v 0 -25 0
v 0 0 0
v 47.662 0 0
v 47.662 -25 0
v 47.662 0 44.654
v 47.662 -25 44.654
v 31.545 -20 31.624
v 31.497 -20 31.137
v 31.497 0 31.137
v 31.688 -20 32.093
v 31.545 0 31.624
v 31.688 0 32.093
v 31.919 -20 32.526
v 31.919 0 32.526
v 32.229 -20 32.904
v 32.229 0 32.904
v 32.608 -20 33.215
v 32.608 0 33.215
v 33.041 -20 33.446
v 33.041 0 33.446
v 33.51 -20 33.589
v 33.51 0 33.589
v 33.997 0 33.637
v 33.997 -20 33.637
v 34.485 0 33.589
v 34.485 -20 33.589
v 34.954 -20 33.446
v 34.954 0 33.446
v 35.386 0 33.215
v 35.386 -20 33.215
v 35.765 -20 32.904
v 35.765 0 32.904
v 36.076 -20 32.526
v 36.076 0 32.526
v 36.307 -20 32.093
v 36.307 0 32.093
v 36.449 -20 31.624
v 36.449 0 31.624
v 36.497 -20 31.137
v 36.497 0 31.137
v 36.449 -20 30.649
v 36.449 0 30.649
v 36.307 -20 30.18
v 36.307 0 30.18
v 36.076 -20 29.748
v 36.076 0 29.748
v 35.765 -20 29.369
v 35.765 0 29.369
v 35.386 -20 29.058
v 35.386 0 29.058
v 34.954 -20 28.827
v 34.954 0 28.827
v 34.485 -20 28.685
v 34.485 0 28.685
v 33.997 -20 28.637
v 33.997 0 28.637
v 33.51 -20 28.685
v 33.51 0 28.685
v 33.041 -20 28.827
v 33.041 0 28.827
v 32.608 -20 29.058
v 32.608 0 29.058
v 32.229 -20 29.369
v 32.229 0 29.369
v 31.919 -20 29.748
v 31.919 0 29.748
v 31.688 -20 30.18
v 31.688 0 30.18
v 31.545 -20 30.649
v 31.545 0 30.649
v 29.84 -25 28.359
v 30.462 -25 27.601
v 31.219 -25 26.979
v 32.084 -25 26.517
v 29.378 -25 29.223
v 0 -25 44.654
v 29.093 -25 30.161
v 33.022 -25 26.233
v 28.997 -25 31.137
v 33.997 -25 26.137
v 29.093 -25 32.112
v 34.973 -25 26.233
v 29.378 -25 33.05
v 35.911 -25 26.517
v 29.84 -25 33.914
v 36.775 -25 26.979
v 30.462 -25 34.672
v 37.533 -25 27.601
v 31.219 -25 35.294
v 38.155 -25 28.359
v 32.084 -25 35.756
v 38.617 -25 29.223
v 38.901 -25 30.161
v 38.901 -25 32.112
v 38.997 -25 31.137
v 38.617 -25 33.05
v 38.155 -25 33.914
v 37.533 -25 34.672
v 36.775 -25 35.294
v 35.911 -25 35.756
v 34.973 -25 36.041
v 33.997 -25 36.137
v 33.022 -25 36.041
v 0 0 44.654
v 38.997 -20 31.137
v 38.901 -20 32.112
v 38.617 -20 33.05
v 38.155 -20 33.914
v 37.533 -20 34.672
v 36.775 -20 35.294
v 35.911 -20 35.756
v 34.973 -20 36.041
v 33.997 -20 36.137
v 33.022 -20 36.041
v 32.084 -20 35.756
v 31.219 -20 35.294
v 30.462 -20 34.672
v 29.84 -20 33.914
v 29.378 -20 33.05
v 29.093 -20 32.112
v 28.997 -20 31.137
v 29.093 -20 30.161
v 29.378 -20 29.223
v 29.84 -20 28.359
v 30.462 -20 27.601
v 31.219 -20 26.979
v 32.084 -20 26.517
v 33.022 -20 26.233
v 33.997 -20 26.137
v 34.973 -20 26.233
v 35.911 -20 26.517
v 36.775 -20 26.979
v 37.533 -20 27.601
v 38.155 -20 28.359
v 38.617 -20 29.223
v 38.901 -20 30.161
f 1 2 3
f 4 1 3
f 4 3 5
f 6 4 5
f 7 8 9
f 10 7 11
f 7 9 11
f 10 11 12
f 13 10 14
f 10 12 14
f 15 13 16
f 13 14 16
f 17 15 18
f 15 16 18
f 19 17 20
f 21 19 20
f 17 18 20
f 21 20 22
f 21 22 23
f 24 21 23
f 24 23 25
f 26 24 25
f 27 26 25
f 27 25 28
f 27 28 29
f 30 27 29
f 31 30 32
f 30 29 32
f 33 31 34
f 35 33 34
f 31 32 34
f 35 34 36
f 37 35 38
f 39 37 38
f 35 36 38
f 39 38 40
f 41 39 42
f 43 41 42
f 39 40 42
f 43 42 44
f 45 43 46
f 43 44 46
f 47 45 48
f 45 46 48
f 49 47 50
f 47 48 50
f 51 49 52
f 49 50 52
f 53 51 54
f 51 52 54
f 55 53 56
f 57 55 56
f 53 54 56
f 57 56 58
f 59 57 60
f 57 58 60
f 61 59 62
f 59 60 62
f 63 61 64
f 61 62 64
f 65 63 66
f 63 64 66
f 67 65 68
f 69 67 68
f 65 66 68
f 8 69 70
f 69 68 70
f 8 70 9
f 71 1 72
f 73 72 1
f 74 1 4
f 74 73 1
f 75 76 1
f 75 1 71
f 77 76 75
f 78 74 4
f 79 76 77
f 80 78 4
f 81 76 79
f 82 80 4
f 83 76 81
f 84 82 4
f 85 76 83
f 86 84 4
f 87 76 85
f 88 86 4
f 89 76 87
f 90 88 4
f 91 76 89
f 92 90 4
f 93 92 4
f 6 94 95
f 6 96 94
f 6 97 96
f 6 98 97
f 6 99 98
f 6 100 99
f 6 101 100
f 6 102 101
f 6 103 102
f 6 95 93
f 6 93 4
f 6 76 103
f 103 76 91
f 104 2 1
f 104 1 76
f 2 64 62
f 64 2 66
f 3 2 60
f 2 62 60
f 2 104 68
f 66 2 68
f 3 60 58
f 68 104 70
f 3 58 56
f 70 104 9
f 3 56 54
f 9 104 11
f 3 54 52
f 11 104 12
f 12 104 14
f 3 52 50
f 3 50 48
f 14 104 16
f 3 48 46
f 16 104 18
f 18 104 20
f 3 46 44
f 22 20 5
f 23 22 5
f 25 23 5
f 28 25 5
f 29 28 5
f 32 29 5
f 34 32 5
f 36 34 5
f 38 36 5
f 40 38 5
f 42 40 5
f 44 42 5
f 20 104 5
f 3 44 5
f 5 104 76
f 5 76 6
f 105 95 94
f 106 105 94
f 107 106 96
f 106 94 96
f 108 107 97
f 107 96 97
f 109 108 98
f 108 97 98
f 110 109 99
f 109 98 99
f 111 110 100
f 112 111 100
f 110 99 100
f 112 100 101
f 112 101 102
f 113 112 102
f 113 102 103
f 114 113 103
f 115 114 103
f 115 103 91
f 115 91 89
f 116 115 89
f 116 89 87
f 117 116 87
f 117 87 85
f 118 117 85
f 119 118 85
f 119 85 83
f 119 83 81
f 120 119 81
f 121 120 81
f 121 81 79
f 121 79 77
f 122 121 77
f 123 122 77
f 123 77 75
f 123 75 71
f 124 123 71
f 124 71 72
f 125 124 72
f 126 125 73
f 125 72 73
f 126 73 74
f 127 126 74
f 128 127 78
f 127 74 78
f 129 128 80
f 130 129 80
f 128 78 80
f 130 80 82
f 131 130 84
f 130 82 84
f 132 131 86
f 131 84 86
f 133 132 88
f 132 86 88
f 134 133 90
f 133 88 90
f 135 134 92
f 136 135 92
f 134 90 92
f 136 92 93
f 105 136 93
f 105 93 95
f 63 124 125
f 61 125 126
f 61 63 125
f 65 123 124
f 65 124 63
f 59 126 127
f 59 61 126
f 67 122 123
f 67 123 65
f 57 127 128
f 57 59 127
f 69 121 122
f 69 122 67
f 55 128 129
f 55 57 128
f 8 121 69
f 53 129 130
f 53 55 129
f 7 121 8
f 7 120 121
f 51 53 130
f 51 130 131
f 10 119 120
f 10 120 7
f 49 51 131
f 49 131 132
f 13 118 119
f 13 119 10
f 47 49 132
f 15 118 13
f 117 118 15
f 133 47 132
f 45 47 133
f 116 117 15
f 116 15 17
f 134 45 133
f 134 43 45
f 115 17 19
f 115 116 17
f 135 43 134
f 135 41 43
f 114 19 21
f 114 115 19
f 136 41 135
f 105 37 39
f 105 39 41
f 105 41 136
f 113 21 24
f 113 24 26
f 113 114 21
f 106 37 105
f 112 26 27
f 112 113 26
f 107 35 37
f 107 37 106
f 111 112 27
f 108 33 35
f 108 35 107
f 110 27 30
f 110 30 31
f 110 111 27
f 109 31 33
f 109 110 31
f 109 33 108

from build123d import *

# Parameters (mm, degrees)
F0_W           = 47.661982
F0_H           = 44.654008
F1_DEPTH       = 25
F3_D           = 5
F3_CBORE_D     = 10
F3_CBORE_DEPTH = 5


with BuildPart() as f1:
    # F0 (on Front) → F1 (new body)
    with BuildSketch(Plane.XZ):
        with Locations((23.830991, 22.327004)):
            Rectangle(F0_W, F0_H)
    extrude(amount=F1_DEPTH)

    # F3 (through all)
    with Locations(Plane.XZ.offset(25)):
        with Locations((33.997253, 31.13661)):
            CounterBoreHole(F3_D / 2, F3_CBORE_D / 2, F3_CBORE_DEPTH)


solid = f1.part
